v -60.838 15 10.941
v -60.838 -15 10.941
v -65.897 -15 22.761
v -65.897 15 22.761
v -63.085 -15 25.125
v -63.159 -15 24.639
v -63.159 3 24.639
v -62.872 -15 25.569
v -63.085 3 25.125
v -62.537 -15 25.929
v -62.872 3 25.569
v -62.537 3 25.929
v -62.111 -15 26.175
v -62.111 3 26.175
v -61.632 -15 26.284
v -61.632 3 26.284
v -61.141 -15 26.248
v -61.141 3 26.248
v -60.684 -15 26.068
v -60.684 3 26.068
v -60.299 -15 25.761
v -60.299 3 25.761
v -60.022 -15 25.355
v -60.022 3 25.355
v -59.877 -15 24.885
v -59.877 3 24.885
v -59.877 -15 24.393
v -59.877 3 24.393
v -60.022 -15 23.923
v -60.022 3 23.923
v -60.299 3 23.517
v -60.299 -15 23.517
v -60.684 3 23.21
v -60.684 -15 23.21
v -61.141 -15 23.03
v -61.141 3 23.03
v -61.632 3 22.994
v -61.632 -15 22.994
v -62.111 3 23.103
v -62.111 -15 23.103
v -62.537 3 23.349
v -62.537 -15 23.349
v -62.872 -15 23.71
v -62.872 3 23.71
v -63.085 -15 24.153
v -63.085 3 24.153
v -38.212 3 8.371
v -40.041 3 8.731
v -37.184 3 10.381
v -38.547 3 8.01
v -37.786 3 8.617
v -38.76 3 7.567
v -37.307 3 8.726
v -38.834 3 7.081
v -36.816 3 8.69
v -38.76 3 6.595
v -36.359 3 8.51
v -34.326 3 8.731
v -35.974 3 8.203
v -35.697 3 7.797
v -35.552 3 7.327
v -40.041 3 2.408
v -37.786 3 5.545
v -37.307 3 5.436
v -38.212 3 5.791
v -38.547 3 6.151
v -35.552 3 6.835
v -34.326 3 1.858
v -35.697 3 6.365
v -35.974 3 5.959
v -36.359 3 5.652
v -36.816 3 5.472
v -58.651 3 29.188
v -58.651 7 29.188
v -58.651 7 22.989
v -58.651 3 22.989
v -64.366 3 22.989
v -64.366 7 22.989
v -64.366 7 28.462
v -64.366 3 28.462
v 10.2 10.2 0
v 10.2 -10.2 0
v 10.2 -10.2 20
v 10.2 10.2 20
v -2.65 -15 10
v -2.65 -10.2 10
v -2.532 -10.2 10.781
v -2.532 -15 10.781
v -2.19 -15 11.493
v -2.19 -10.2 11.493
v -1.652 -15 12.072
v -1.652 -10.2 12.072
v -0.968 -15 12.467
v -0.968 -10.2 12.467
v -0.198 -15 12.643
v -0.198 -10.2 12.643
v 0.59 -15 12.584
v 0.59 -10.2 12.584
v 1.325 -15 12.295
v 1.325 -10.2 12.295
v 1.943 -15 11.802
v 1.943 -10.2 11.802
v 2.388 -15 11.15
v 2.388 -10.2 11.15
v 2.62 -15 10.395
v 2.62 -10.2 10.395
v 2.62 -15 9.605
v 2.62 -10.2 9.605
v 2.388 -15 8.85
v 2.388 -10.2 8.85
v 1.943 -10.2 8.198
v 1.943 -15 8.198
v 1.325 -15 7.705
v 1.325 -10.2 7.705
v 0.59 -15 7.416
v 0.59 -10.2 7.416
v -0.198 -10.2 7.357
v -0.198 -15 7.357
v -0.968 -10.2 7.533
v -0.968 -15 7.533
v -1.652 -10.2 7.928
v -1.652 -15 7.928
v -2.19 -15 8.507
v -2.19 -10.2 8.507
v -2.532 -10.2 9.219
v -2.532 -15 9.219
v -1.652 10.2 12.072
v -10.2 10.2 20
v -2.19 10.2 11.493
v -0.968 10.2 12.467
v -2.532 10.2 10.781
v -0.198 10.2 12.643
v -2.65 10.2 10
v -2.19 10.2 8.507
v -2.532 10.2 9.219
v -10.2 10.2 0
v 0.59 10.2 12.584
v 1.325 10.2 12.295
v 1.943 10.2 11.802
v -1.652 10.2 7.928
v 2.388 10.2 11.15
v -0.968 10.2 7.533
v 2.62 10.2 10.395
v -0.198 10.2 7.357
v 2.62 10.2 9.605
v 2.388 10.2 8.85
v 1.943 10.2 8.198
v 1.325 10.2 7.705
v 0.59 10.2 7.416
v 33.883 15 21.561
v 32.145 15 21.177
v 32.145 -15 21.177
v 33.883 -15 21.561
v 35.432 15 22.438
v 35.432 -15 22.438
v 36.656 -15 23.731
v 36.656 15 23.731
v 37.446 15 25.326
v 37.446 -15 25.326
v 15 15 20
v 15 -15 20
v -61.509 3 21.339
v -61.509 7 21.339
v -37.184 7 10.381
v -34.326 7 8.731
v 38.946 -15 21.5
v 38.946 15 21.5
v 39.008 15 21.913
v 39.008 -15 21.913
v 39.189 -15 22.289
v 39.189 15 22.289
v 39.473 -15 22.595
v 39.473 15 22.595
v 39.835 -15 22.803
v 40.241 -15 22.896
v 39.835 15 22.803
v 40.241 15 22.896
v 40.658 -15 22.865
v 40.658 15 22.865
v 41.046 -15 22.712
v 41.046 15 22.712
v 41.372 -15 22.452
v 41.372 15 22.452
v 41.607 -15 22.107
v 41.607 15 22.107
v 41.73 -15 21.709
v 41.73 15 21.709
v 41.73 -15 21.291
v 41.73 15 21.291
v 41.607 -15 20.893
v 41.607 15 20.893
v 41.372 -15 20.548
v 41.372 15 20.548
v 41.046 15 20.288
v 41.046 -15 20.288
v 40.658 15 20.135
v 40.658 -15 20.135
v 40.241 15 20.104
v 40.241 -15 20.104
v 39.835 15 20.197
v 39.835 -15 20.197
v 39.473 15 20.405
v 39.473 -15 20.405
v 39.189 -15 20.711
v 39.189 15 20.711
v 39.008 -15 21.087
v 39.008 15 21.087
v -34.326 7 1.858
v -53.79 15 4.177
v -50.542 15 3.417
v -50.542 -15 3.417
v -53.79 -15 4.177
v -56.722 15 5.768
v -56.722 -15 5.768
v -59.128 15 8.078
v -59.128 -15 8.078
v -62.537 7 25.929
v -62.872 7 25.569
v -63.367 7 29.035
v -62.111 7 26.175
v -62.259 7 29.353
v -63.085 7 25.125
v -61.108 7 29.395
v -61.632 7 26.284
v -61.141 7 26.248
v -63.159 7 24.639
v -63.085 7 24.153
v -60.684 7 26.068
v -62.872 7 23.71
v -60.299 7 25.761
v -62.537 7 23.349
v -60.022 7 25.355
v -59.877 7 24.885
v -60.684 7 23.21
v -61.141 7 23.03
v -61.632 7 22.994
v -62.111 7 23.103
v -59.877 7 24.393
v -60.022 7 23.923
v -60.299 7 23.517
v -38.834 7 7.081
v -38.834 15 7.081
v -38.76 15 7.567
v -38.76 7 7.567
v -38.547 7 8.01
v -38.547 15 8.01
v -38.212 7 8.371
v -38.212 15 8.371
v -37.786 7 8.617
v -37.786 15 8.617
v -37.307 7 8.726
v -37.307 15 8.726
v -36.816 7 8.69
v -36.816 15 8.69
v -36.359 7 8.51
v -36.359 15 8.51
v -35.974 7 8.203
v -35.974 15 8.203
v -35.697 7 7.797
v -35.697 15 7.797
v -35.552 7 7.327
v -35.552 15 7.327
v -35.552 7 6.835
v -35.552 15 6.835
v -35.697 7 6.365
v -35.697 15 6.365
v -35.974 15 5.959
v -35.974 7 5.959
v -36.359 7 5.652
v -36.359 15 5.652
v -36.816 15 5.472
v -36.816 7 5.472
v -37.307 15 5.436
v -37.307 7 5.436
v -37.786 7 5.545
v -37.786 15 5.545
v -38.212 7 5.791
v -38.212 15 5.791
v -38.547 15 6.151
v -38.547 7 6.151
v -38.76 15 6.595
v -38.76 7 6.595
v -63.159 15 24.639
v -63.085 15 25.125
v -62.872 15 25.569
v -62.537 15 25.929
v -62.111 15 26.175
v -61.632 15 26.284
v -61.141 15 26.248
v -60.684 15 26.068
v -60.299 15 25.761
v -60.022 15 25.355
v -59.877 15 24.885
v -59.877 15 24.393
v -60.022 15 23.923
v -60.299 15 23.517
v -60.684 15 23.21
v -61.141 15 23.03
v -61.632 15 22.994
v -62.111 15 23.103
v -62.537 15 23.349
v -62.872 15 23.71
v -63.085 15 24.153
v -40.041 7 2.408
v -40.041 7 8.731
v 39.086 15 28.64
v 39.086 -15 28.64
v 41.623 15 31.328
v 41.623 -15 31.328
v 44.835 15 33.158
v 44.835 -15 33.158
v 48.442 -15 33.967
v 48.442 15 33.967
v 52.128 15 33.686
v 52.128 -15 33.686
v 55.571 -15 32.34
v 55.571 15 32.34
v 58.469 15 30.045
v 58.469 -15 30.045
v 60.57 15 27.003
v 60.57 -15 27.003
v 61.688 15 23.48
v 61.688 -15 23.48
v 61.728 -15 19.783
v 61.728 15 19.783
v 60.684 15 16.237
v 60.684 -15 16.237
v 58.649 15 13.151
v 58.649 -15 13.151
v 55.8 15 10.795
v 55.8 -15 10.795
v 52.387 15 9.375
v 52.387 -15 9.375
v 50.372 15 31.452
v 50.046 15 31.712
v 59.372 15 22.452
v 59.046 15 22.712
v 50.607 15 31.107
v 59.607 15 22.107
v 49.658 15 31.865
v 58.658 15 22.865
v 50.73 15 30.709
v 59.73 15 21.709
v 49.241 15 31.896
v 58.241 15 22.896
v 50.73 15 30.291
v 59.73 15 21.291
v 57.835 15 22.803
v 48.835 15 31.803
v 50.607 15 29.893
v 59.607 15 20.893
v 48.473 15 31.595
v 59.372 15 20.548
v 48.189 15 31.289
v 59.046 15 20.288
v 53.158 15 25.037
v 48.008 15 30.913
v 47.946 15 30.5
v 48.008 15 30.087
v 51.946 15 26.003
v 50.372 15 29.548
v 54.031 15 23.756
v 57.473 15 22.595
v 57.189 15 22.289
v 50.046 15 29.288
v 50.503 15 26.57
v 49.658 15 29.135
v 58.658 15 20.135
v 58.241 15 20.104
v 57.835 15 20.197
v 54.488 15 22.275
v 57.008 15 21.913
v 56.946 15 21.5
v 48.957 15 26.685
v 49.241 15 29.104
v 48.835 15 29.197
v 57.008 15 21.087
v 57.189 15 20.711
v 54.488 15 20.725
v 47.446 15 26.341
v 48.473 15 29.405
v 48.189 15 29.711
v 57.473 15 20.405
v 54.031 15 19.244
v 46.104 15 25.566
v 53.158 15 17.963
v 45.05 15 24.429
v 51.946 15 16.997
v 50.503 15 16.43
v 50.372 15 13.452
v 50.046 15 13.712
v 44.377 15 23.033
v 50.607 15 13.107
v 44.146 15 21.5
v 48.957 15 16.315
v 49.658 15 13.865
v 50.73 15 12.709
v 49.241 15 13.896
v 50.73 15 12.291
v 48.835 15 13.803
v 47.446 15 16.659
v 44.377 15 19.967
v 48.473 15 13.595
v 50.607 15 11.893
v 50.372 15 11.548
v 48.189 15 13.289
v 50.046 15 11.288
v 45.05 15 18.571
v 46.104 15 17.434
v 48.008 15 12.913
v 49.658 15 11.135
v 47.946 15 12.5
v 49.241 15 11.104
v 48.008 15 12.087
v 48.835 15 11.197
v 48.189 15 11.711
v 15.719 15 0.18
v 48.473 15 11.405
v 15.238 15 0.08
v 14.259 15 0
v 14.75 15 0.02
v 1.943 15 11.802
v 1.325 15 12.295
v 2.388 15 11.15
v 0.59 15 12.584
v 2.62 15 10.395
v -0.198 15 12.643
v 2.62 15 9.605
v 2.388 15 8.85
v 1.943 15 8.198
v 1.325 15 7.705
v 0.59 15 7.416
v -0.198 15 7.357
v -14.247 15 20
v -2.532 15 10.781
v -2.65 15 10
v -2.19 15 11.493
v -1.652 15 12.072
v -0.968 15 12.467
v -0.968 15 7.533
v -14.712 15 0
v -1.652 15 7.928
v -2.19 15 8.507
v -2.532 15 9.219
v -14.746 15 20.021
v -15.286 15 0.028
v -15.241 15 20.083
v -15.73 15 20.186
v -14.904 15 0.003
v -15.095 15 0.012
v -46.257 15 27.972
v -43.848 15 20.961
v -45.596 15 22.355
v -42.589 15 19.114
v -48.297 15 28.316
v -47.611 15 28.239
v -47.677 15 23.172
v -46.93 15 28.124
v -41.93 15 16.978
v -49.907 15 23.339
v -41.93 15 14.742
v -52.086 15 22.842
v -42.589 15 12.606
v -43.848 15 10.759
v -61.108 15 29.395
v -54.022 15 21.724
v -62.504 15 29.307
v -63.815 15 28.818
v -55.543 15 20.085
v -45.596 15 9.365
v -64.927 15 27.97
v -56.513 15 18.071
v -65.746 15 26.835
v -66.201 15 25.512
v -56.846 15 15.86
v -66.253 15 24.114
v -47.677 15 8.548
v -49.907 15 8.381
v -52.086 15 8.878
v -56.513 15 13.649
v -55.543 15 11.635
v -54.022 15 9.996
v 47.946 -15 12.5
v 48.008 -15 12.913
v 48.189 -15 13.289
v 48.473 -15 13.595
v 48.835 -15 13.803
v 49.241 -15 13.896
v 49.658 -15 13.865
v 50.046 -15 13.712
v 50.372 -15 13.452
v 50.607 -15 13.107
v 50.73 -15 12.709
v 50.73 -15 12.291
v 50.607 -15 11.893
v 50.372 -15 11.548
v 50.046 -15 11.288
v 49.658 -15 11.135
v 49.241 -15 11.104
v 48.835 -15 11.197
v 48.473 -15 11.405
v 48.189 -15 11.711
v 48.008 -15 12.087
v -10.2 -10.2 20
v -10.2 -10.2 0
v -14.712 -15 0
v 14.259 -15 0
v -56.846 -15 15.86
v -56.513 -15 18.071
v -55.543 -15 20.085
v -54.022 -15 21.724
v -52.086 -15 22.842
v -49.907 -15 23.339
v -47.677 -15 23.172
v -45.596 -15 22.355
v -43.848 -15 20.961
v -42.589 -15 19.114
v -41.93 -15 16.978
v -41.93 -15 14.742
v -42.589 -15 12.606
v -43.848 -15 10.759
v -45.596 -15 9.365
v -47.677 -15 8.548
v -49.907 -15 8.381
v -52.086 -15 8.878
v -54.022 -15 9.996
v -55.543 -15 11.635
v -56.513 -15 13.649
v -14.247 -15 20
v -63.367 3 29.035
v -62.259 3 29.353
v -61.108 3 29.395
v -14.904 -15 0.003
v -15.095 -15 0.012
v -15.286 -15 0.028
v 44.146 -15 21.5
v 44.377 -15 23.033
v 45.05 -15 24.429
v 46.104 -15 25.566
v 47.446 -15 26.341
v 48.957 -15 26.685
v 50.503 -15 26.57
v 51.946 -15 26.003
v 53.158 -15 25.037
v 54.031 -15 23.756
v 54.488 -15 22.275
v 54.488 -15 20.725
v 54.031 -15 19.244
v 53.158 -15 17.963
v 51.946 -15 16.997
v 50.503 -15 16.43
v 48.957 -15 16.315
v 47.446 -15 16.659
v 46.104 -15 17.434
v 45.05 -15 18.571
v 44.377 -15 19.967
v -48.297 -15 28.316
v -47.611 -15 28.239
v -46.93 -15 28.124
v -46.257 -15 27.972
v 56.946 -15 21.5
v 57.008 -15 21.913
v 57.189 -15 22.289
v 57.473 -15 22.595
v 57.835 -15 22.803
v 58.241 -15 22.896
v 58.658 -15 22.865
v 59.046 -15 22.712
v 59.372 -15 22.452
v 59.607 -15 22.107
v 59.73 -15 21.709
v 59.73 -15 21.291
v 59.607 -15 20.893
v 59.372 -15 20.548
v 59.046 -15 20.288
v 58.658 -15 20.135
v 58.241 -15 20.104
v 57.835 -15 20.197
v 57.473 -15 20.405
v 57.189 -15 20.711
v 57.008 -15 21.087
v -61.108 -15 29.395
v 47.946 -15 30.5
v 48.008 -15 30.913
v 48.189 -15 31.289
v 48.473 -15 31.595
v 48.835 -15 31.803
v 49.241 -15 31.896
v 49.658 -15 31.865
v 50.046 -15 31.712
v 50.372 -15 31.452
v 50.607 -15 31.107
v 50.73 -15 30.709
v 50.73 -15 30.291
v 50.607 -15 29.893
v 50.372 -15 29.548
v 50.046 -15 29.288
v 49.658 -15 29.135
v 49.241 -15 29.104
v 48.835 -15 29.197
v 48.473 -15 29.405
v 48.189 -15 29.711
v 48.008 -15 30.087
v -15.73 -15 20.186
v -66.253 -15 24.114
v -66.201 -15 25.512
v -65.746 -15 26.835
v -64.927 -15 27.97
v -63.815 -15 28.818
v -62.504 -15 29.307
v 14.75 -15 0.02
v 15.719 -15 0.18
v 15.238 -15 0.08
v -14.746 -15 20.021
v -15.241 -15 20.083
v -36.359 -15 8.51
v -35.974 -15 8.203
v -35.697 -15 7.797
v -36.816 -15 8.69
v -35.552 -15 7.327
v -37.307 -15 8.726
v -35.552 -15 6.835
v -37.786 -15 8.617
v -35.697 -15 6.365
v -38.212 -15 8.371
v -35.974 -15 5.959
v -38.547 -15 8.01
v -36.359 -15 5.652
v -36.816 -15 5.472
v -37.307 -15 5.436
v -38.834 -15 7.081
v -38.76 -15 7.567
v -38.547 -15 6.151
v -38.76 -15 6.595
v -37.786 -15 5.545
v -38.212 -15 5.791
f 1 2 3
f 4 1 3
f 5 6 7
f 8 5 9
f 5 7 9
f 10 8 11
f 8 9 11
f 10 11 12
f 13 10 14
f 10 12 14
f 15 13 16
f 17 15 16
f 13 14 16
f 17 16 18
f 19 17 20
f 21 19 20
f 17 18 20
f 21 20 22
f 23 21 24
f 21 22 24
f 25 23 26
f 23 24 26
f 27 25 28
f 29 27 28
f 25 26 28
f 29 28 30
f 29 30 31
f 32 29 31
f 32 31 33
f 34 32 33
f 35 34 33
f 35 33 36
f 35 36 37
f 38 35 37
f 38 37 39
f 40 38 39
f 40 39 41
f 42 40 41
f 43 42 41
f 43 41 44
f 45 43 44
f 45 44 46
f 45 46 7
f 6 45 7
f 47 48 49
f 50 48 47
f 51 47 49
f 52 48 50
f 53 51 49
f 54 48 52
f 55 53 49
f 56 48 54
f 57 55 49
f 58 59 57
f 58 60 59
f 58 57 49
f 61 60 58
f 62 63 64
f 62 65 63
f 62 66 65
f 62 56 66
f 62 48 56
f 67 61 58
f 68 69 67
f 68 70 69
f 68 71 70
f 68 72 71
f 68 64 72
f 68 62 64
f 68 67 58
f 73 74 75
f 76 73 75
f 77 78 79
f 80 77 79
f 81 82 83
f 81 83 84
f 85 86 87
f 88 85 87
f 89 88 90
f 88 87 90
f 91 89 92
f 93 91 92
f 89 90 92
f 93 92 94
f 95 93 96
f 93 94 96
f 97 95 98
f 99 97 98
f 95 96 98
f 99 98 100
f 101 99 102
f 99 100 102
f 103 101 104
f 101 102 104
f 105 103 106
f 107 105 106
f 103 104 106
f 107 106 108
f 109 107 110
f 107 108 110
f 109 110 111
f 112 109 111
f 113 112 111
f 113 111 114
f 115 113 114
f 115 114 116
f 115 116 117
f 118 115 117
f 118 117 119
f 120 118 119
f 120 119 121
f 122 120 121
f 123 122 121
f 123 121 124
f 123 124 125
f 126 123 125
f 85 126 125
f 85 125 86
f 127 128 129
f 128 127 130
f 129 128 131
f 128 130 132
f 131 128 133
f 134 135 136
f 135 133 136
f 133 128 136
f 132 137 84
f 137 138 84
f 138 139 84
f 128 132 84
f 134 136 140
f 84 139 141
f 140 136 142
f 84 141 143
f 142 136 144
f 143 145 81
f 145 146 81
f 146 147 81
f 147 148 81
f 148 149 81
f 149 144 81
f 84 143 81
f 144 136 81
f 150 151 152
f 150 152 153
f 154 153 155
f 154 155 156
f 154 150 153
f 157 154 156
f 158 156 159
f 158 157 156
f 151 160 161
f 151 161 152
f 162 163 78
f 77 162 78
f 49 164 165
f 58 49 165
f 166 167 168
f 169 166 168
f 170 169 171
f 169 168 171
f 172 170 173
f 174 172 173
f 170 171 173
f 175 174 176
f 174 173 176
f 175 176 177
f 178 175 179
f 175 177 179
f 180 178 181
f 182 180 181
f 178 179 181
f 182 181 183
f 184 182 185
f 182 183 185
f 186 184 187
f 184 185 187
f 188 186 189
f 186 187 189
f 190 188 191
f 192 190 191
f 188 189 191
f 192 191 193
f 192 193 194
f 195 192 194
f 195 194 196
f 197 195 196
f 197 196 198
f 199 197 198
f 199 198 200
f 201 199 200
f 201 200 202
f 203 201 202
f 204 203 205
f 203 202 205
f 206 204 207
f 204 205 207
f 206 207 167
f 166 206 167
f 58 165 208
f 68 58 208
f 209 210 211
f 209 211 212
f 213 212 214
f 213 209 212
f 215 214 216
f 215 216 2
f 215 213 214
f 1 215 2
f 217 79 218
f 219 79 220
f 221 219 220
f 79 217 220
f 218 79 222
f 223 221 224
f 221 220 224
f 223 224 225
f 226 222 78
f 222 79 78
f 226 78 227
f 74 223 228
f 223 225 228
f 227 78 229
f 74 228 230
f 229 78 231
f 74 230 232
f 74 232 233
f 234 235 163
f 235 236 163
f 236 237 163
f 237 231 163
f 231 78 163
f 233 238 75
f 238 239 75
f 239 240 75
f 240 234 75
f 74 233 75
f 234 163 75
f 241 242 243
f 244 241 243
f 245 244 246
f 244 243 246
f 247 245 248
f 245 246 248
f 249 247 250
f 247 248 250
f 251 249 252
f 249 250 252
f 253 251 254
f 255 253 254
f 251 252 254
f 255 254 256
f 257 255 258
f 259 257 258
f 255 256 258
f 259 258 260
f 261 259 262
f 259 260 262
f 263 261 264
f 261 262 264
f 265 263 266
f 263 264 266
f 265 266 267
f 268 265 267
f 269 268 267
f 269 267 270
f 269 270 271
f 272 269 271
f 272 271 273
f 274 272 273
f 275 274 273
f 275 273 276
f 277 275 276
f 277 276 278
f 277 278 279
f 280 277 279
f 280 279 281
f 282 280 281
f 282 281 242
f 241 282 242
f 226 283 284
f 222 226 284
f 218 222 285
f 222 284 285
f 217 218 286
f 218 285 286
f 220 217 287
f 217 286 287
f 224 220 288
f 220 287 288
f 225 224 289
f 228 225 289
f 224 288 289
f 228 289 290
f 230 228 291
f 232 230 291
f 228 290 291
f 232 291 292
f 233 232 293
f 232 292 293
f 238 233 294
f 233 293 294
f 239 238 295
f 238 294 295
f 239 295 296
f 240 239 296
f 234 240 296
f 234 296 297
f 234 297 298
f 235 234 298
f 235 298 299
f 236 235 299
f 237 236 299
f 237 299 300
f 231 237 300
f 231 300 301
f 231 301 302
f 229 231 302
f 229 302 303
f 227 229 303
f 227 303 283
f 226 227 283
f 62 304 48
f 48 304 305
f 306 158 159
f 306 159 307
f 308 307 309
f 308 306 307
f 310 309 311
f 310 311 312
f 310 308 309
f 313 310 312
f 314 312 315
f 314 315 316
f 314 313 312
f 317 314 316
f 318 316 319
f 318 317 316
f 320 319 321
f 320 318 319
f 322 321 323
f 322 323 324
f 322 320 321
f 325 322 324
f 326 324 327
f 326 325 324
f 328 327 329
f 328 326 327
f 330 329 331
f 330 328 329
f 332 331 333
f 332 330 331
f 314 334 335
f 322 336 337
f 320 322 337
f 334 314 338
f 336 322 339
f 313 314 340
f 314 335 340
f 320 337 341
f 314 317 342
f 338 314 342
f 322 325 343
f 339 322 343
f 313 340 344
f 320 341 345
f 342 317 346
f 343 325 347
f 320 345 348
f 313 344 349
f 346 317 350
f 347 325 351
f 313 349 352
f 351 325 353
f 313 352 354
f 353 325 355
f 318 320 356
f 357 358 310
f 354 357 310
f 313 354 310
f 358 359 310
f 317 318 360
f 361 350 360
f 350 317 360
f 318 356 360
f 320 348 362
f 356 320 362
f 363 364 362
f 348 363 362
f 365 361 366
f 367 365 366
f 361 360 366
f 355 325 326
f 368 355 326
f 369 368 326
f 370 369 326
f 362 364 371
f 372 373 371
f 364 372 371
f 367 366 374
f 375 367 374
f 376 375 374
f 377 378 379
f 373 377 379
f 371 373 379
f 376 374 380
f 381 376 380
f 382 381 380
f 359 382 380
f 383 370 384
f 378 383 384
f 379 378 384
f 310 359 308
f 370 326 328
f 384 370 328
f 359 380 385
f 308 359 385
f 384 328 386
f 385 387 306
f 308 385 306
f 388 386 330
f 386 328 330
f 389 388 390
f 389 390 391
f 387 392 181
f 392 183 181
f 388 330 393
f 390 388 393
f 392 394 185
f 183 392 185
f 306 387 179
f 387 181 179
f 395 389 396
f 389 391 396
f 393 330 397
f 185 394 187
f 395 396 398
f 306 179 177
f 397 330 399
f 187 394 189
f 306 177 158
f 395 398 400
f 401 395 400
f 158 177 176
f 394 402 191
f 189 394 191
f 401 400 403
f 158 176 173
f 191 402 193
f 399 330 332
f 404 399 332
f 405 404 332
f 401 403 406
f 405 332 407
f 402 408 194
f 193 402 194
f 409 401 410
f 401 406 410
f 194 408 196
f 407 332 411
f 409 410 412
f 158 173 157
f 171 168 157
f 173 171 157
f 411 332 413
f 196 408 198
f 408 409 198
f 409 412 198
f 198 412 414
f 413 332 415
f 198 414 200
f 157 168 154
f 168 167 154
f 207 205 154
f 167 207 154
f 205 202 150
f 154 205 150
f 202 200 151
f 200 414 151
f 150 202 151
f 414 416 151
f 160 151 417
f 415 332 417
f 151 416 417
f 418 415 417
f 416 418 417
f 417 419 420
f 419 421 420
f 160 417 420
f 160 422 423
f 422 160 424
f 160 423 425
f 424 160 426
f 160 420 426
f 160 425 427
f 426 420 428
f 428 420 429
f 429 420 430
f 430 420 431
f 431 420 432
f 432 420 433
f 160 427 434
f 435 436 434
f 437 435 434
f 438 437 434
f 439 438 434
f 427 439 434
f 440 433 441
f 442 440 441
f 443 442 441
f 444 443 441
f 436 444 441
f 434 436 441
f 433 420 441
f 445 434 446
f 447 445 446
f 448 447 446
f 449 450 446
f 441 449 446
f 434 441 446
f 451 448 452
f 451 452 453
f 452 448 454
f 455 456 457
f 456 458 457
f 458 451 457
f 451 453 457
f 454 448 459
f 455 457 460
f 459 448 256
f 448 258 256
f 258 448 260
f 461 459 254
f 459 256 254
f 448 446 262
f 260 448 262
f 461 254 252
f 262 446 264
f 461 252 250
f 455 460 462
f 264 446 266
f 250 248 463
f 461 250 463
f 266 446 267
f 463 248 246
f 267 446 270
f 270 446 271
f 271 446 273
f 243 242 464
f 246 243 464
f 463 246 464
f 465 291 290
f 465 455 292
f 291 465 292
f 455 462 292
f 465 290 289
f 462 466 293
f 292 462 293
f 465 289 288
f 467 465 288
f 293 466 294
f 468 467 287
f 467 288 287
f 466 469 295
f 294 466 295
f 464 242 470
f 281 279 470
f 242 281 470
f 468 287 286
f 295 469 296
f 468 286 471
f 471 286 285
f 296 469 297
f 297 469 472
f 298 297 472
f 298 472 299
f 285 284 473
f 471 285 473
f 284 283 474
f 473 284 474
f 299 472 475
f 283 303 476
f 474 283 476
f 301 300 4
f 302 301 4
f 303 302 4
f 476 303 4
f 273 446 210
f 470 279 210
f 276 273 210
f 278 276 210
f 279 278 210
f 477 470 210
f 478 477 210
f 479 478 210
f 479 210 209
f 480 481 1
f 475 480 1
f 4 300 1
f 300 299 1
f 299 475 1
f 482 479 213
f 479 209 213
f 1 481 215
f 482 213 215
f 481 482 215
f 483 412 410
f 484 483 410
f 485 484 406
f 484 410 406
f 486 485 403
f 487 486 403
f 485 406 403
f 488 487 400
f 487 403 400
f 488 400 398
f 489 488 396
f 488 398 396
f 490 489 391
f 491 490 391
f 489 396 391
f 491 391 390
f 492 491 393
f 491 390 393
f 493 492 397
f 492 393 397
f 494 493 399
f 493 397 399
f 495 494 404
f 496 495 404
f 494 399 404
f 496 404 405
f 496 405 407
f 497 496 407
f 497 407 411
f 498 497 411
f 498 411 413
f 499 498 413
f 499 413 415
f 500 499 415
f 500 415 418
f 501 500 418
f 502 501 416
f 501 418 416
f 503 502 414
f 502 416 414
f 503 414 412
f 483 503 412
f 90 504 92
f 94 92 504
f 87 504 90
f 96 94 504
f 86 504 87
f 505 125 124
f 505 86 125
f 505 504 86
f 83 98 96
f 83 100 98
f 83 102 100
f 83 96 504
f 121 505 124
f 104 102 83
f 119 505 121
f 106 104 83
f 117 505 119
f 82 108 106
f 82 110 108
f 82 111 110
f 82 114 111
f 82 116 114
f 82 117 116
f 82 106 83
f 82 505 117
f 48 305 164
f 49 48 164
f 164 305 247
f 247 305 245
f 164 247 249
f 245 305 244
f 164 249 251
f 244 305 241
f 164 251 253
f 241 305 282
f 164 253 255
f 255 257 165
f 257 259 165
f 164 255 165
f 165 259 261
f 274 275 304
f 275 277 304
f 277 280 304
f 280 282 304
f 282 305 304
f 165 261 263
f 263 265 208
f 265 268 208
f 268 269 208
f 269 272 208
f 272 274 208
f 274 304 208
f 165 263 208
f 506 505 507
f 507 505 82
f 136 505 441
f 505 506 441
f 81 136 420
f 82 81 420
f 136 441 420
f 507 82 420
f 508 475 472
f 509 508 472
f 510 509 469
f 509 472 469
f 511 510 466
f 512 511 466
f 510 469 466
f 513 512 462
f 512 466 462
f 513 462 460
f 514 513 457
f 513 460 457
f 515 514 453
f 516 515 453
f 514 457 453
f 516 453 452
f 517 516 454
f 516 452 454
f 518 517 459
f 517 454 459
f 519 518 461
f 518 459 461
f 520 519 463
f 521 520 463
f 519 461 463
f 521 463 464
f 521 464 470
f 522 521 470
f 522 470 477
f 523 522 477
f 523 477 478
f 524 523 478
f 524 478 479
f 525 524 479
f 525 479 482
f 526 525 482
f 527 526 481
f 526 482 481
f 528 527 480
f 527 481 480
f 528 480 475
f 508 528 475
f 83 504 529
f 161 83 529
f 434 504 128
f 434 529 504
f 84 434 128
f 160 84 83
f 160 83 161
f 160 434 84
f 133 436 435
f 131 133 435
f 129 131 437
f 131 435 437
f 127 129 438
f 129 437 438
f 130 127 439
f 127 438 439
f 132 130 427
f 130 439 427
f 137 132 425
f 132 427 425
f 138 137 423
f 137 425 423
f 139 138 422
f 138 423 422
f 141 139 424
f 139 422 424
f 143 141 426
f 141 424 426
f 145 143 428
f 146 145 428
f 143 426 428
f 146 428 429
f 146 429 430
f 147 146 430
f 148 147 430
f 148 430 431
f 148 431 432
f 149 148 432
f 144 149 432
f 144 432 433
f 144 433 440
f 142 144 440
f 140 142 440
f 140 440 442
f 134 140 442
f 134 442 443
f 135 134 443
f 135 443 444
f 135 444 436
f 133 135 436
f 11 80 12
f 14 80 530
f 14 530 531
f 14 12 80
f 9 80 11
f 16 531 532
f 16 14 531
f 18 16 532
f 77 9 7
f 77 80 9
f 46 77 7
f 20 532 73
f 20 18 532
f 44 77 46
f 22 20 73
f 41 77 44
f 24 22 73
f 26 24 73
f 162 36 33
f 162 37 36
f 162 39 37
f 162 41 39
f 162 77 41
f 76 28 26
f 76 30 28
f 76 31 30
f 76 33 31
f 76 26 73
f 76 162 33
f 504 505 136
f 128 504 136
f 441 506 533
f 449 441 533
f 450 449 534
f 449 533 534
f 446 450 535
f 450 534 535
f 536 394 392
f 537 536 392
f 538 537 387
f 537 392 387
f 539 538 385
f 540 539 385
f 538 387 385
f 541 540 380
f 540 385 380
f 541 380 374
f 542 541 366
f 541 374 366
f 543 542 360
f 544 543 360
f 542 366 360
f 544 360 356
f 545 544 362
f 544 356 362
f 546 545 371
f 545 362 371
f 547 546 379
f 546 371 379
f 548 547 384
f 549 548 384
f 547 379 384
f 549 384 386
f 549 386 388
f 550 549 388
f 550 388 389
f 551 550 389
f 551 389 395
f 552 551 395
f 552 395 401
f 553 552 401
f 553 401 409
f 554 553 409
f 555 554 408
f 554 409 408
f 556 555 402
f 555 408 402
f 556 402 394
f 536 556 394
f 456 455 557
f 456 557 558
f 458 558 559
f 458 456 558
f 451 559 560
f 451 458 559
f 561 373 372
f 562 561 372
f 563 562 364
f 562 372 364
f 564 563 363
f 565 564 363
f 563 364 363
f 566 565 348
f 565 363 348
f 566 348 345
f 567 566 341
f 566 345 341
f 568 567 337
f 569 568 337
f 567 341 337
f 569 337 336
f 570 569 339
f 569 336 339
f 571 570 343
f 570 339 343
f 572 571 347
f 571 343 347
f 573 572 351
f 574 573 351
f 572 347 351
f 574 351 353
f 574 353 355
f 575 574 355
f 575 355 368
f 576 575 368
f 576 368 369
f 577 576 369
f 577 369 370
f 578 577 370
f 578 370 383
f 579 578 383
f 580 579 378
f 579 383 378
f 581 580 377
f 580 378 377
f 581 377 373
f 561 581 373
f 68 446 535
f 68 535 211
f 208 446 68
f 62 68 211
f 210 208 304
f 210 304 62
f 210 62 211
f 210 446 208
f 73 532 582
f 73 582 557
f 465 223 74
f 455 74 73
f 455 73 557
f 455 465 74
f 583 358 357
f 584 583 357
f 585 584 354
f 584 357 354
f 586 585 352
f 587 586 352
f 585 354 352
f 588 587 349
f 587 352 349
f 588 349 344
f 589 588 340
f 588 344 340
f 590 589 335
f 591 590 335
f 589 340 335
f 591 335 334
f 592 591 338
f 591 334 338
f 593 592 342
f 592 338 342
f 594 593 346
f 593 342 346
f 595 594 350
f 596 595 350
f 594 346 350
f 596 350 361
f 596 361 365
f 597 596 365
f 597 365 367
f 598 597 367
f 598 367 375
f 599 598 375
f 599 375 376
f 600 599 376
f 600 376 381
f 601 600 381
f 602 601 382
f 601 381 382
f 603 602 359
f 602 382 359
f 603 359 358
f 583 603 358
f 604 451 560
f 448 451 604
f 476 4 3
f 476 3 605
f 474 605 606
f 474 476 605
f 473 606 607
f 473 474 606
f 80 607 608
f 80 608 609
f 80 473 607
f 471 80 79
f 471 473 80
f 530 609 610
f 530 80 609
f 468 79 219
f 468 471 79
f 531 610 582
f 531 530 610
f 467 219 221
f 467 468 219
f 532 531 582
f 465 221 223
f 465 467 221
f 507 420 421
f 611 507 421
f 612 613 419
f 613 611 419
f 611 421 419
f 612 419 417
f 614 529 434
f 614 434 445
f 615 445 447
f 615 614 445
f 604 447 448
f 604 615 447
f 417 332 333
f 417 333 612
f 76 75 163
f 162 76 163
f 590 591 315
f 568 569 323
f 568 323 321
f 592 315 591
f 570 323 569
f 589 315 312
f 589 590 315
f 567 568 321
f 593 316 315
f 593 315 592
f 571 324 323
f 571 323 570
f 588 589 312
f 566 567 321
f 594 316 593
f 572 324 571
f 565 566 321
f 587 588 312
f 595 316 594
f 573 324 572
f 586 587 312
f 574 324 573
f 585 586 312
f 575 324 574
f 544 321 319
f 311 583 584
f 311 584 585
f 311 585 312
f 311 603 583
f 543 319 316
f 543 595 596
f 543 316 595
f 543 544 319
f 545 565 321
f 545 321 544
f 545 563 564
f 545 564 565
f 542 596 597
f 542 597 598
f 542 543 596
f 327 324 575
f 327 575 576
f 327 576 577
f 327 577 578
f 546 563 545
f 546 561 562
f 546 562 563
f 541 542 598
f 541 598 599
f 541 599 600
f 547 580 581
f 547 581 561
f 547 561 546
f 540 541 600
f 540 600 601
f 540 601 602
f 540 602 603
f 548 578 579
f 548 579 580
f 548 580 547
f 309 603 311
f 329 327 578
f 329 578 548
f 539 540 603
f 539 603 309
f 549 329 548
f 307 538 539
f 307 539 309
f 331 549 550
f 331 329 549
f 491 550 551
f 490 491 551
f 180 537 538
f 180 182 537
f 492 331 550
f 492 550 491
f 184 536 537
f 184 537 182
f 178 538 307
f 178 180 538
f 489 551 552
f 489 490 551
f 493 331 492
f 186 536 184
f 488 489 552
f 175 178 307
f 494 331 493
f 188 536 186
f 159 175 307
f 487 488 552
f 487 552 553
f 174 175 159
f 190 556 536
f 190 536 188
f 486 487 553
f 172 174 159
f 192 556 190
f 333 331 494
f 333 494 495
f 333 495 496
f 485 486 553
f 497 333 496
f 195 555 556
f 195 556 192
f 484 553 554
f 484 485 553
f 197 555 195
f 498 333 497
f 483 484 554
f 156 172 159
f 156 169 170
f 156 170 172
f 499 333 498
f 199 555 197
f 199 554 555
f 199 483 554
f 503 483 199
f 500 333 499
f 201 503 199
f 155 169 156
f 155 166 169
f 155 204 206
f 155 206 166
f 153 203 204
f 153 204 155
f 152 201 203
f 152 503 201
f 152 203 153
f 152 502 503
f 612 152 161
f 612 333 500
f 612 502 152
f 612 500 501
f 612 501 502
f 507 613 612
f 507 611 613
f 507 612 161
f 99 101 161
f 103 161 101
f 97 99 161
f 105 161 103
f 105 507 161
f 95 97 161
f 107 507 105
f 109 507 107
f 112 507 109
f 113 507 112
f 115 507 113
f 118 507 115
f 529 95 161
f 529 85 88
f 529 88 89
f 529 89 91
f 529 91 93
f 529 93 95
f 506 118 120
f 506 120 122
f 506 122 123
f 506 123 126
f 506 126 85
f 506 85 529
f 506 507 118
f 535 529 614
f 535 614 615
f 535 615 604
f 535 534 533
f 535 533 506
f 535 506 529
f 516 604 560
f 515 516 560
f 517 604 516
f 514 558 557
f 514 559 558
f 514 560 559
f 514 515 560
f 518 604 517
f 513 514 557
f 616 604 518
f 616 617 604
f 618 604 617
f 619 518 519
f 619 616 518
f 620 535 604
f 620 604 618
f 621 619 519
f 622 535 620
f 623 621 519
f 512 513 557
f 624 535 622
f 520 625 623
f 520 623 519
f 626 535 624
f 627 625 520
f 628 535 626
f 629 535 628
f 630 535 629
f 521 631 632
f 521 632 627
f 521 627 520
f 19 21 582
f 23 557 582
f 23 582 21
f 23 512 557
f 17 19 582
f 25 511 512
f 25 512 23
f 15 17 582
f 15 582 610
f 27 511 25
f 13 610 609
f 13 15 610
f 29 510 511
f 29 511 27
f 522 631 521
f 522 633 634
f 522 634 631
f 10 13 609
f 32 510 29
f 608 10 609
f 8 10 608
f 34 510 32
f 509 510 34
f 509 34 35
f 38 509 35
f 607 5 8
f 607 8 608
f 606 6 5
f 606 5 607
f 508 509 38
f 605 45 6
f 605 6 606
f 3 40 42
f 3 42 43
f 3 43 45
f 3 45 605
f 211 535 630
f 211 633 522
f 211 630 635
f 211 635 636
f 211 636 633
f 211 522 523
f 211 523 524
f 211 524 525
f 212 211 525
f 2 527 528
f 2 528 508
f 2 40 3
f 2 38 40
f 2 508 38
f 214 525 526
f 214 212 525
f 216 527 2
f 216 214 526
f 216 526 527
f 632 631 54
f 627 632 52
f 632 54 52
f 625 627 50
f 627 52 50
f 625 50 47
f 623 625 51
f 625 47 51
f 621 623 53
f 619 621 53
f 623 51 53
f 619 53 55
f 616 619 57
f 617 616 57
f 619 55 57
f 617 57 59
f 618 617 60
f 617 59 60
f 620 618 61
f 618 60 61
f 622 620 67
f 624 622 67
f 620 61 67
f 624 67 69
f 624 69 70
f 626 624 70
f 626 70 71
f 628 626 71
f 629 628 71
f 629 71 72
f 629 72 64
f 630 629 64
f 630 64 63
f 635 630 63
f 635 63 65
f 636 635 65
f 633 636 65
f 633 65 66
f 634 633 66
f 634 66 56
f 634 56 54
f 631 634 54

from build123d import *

# Parameters (mm, degrees)
SKETCH1_W           = 30
SKETCH1_H           = 30
SKETCH1_W_2         = 20.4
SKETCH1_H_2         = 20.4
BOSS_EXTRUDE1_DEPTH = 20
SKETCH2_R           = 2.65
CUT_EXTRUDE1_DEPTH  = 40.05124838
SKETCH3_R           = 1.65
SKETCH3_R_2         = 7.5
SKETCH3_R_3         = 1.4
SKETCH3_R_4         = 5.2
BOSS_EXTRUDE2_DEPTH = 30
CUT_EXTRUDE5_START  = -8
CUT_EXTRUDE5_DEPTH  = 4
FILLET1_R           = 6


with BuildPart() as part:
    # Sketch1 → Boss-Extrude1 (new body)
    with BuildSketch(Plane.XY):
        Rectangle(SKETCH1_W, SKETCH1_H)
        Rectangle(SKETCH1_W_2, SKETCH1_H_2, mode=Mode.SUBTRACT)
    extrude(amount=BOSS_EXTRUDE1_DEPTH)

    # Sketch2 → Cut-Extrude1 (cut, through all)
    with BuildSketch(Plane(origin=(0, 15, 0), x_dir=(1, 0, 0), z_dir=(0, 1, 0))):
        with Locations(Location((0, -10, 0), (0, 0, 180))):
            Circle(SKETCH2_R)
    extrude(amount=-CUT_EXTRUDE1_DEPTH, mode=Mode.SUBTRACT)

    # Sketch3 → Boss-Extrude2 (add)
    # profile 1 of 2: a face of its own
    with BuildSketch(Plane(origin=(0, 15, 0), x_dir=(1, 0, 0), z_dir=(0, 1, 0))):
        with BuildLine():
            ThreePointArc((-65.896564393, -22.761029428), (-65.378707028, -27.432622684), (-61.107872478, -29.395256638))
            Line((-61.107872478, -29.395256638), (-48.296614461, -28.315868679))
            ThreePointArc((-48.296614461, -28.315868679), (-47.269565487, -28.186320273), (-46.256757774, -27.972234028))
            Line((-46.256757774, -27.972234028), (-15, -20))
            Line((-15, -20), (-15, 0))
            Line((-15, 0), (-50.542410203, -3.417381881))
            ThreePointArc((-50.542410203, -3.417381881), (-56.721658538, -5.767897005), (-60.8377203, -10.941490233))
            Line((-60.8377203, -10.941490233), (-65.896564393, -22.761029428))
        make_face()
        with Locations(Location((-61.508592346, -24.639111653, 0), (0, 0, 180))):
            Circle(SKETCH3_R, mode=Mode.SUBTRACT)
        with Locations(Location((-49.346059773, -15.86, 0), (0, 0, 180))):
            Circle(SKETCH3_R_2, mode=Mode.SUBTRACT)
        with Locations(Location((-37.1835272, -7.080888347, 0), (0, 0, 180))):
            Circle(SKETCH3_R, mode=Mode.SUBTRACT)
    # profile 2 of 2: a face of its own
    with BuildSketch(Plane(origin=(0, 15, 0), x_dir=(1, 0, 0), z_dir=(0, 1, 0))):
        with BuildLine():
            Line((52.386539741, -9.375418293), (15, 0))
            Line((15, 0), (15, -20))
            Line((15, -20), (36.846059773, -21.5))
            ThreePointArc((36.846059773, -21.5), (57.035142957, -31.355353865), (52.386539741, -9.375418293))
        make_face()
        with Locations(Location((49.346059773, -12.5, 0), (0, 0, 180))):
            Circle(SKETCH3_R_3, mode=Mode.SUBTRACT)
        with Locations(Location((49.346059773, -30.5, 0), (0, 0, 180))):
            Circle(SKETCH3_R_3, mode=Mode.SUBTRACT)
        with Locations(Location((40.346059773, -21.5, 0), (0, 0, 180))):
            Circle(SKETCH3_R_3, mode=Mode.SUBTRACT)
        with Locations(Location((49.346059773, -21.5, 0), (0, 0, 180))):
            Circle(SKETCH3_R_4, mode=Mode.SUBTRACT)
        with Locations(Location((58.346059773, -21.5, 0), (0, 0, 180))):
            Circle(SKETCH3_R_3, mode=Mode.SUBTRACT)
    extrude(amount=-BOSS_EXTRUDE2_DEPTH)

    # Sketch5 → Cut-Extrude5 (cut)
    with BuildSketch(Plane(origin=(0, 15, 0), x_dir=(1, 0, 0), z_dir=(0, 1, 0)).offset(CUT_EXTRUDE5_START)):
        Polygon((-40.041411033, -8.730888347), (-37.1835272, -10.380888347), (-34.325643368, -8.730888347), align=None)
        Polygon((-40.041411033, -8.730888347), (-34.325643368, -8.730888347), (-34.325643368, -5.430888347), (-37.1835272, -3.780888347), (-40.041411033, -5.430888347), align=None)
        Polygon((-37.1835272, -3.780888347), (-34.325643368, -5.430888347), (-34.325643368, 4.153358906), (-40.041411033, 4.153358906), (-40.041411033, -5.430888347), align=None)
        Polygon((-64.366476179, -26.289111653), (-61.508592346, -27.939111653), (-58.650708514, -26.289111653), (-58.650708514, -22.989111653), (-64.366476179, -22.989111653), align=None)
        Polygon((-58.650708514, -26.289111653), (-61.508592346, -27.939111653), (-64.366476179, -26.289111653), (-64.366476179, -31.820729818), (-58.650708514, -31.820729818), align=None)
        Polygon((-64.366476179, -22.989111653), (-58.650708514, -22.989111653), (-61.508592346, -21.339111653), align=None)
    extrude(amount=-CUT_EXTRUDE5_DEPTH, mode=Mode.SUBTRACT)

    # Fillet1
    # the kernel refuses this fillet: 6 mm, written as the material it adds along each edge
    with BuildSketch(Plane(origin=(36.846059773, 15, 21.5), x_dir=(0.15492828046990675, 0, 0.9879257198345622), z_dir=(0, -1, 0))) as fillet1_piece_1:
        with BuildLine():
            CenterArc((4.802776695, 5.927554319), FILLET1_R, 192.840529968, 68.246833251)
            Line((-1.047177652, 4.594124851), (0, 0))
            ThreePointArc((0, 0), (1.936603506, 0.150928502), (3.873207012, 0))
        make_face()
    extrude(amount=30)
    with BuildSketch(Plane(origin=(-15, -15, 20), x_dir=(1, 0, 0), z_dir=(0, 1, 0))) as fillet1_piece_2:
        with BuildLine():
            CenterArc((FILLET1_R * 0.125518959216, -FILLET1_R), FILLET1_R, 90, 14.308582401)
            Line((-FILLET1_R * 0.121625200721, -FILLET1_R * 0.0310212777315), (0, 0))
            Line((0, 0), (FILLET1_R * 0.125518959216, 0))
        make_face()
    extrude(amount=30)
    # the kernel refuses this fillet: 6 mm, written as the material it takes off along each edge
    with BuildSketch(Plane(origin=(15, 16.852100476, 0), x_dir=(-1, 0, 0), z_dir=(0, -1, 0))) as fillet1_2_piece_1:
        with BuildLine():
            CenterArc((FILLET1_R * 0.123473365094, -FILLET1_R), FILLET1_R, 90, 14.07775236)
            Line((-FILLET1_R * 0.119765032297, -FILLET1_R * 0.0300334634457), (0, 0))
            Line((0, 0), (FILLET1_R * 0.123473365094, 0))
        make_face()
    extrude(amount=33.704200953, mode=Mode.SUBTRACT)
    with BuildSketch(Plane(origin=(-15, -15.71946162, 0), x_dir=(1, 0, 0), z_dir=(0, 1, 0))) as fillet1_2_piece_2:
        with BuildLine():
            CenterArc((FILLET1_R * 0.0479641080127, -FILLET1_R), FILLET1_R, 90, 5.492072889)
            Line((-FILLET1_R * 0.0477439263528, -FILLET1_R * 0.004590550498), (0, 0))
            Line((0, 0), (FILLET1_R * 0.0479641080127, 0))
        make_face()
    extrude(amount=31.43892324, mode=Mode.SUBTRACT)


solid = part.part
